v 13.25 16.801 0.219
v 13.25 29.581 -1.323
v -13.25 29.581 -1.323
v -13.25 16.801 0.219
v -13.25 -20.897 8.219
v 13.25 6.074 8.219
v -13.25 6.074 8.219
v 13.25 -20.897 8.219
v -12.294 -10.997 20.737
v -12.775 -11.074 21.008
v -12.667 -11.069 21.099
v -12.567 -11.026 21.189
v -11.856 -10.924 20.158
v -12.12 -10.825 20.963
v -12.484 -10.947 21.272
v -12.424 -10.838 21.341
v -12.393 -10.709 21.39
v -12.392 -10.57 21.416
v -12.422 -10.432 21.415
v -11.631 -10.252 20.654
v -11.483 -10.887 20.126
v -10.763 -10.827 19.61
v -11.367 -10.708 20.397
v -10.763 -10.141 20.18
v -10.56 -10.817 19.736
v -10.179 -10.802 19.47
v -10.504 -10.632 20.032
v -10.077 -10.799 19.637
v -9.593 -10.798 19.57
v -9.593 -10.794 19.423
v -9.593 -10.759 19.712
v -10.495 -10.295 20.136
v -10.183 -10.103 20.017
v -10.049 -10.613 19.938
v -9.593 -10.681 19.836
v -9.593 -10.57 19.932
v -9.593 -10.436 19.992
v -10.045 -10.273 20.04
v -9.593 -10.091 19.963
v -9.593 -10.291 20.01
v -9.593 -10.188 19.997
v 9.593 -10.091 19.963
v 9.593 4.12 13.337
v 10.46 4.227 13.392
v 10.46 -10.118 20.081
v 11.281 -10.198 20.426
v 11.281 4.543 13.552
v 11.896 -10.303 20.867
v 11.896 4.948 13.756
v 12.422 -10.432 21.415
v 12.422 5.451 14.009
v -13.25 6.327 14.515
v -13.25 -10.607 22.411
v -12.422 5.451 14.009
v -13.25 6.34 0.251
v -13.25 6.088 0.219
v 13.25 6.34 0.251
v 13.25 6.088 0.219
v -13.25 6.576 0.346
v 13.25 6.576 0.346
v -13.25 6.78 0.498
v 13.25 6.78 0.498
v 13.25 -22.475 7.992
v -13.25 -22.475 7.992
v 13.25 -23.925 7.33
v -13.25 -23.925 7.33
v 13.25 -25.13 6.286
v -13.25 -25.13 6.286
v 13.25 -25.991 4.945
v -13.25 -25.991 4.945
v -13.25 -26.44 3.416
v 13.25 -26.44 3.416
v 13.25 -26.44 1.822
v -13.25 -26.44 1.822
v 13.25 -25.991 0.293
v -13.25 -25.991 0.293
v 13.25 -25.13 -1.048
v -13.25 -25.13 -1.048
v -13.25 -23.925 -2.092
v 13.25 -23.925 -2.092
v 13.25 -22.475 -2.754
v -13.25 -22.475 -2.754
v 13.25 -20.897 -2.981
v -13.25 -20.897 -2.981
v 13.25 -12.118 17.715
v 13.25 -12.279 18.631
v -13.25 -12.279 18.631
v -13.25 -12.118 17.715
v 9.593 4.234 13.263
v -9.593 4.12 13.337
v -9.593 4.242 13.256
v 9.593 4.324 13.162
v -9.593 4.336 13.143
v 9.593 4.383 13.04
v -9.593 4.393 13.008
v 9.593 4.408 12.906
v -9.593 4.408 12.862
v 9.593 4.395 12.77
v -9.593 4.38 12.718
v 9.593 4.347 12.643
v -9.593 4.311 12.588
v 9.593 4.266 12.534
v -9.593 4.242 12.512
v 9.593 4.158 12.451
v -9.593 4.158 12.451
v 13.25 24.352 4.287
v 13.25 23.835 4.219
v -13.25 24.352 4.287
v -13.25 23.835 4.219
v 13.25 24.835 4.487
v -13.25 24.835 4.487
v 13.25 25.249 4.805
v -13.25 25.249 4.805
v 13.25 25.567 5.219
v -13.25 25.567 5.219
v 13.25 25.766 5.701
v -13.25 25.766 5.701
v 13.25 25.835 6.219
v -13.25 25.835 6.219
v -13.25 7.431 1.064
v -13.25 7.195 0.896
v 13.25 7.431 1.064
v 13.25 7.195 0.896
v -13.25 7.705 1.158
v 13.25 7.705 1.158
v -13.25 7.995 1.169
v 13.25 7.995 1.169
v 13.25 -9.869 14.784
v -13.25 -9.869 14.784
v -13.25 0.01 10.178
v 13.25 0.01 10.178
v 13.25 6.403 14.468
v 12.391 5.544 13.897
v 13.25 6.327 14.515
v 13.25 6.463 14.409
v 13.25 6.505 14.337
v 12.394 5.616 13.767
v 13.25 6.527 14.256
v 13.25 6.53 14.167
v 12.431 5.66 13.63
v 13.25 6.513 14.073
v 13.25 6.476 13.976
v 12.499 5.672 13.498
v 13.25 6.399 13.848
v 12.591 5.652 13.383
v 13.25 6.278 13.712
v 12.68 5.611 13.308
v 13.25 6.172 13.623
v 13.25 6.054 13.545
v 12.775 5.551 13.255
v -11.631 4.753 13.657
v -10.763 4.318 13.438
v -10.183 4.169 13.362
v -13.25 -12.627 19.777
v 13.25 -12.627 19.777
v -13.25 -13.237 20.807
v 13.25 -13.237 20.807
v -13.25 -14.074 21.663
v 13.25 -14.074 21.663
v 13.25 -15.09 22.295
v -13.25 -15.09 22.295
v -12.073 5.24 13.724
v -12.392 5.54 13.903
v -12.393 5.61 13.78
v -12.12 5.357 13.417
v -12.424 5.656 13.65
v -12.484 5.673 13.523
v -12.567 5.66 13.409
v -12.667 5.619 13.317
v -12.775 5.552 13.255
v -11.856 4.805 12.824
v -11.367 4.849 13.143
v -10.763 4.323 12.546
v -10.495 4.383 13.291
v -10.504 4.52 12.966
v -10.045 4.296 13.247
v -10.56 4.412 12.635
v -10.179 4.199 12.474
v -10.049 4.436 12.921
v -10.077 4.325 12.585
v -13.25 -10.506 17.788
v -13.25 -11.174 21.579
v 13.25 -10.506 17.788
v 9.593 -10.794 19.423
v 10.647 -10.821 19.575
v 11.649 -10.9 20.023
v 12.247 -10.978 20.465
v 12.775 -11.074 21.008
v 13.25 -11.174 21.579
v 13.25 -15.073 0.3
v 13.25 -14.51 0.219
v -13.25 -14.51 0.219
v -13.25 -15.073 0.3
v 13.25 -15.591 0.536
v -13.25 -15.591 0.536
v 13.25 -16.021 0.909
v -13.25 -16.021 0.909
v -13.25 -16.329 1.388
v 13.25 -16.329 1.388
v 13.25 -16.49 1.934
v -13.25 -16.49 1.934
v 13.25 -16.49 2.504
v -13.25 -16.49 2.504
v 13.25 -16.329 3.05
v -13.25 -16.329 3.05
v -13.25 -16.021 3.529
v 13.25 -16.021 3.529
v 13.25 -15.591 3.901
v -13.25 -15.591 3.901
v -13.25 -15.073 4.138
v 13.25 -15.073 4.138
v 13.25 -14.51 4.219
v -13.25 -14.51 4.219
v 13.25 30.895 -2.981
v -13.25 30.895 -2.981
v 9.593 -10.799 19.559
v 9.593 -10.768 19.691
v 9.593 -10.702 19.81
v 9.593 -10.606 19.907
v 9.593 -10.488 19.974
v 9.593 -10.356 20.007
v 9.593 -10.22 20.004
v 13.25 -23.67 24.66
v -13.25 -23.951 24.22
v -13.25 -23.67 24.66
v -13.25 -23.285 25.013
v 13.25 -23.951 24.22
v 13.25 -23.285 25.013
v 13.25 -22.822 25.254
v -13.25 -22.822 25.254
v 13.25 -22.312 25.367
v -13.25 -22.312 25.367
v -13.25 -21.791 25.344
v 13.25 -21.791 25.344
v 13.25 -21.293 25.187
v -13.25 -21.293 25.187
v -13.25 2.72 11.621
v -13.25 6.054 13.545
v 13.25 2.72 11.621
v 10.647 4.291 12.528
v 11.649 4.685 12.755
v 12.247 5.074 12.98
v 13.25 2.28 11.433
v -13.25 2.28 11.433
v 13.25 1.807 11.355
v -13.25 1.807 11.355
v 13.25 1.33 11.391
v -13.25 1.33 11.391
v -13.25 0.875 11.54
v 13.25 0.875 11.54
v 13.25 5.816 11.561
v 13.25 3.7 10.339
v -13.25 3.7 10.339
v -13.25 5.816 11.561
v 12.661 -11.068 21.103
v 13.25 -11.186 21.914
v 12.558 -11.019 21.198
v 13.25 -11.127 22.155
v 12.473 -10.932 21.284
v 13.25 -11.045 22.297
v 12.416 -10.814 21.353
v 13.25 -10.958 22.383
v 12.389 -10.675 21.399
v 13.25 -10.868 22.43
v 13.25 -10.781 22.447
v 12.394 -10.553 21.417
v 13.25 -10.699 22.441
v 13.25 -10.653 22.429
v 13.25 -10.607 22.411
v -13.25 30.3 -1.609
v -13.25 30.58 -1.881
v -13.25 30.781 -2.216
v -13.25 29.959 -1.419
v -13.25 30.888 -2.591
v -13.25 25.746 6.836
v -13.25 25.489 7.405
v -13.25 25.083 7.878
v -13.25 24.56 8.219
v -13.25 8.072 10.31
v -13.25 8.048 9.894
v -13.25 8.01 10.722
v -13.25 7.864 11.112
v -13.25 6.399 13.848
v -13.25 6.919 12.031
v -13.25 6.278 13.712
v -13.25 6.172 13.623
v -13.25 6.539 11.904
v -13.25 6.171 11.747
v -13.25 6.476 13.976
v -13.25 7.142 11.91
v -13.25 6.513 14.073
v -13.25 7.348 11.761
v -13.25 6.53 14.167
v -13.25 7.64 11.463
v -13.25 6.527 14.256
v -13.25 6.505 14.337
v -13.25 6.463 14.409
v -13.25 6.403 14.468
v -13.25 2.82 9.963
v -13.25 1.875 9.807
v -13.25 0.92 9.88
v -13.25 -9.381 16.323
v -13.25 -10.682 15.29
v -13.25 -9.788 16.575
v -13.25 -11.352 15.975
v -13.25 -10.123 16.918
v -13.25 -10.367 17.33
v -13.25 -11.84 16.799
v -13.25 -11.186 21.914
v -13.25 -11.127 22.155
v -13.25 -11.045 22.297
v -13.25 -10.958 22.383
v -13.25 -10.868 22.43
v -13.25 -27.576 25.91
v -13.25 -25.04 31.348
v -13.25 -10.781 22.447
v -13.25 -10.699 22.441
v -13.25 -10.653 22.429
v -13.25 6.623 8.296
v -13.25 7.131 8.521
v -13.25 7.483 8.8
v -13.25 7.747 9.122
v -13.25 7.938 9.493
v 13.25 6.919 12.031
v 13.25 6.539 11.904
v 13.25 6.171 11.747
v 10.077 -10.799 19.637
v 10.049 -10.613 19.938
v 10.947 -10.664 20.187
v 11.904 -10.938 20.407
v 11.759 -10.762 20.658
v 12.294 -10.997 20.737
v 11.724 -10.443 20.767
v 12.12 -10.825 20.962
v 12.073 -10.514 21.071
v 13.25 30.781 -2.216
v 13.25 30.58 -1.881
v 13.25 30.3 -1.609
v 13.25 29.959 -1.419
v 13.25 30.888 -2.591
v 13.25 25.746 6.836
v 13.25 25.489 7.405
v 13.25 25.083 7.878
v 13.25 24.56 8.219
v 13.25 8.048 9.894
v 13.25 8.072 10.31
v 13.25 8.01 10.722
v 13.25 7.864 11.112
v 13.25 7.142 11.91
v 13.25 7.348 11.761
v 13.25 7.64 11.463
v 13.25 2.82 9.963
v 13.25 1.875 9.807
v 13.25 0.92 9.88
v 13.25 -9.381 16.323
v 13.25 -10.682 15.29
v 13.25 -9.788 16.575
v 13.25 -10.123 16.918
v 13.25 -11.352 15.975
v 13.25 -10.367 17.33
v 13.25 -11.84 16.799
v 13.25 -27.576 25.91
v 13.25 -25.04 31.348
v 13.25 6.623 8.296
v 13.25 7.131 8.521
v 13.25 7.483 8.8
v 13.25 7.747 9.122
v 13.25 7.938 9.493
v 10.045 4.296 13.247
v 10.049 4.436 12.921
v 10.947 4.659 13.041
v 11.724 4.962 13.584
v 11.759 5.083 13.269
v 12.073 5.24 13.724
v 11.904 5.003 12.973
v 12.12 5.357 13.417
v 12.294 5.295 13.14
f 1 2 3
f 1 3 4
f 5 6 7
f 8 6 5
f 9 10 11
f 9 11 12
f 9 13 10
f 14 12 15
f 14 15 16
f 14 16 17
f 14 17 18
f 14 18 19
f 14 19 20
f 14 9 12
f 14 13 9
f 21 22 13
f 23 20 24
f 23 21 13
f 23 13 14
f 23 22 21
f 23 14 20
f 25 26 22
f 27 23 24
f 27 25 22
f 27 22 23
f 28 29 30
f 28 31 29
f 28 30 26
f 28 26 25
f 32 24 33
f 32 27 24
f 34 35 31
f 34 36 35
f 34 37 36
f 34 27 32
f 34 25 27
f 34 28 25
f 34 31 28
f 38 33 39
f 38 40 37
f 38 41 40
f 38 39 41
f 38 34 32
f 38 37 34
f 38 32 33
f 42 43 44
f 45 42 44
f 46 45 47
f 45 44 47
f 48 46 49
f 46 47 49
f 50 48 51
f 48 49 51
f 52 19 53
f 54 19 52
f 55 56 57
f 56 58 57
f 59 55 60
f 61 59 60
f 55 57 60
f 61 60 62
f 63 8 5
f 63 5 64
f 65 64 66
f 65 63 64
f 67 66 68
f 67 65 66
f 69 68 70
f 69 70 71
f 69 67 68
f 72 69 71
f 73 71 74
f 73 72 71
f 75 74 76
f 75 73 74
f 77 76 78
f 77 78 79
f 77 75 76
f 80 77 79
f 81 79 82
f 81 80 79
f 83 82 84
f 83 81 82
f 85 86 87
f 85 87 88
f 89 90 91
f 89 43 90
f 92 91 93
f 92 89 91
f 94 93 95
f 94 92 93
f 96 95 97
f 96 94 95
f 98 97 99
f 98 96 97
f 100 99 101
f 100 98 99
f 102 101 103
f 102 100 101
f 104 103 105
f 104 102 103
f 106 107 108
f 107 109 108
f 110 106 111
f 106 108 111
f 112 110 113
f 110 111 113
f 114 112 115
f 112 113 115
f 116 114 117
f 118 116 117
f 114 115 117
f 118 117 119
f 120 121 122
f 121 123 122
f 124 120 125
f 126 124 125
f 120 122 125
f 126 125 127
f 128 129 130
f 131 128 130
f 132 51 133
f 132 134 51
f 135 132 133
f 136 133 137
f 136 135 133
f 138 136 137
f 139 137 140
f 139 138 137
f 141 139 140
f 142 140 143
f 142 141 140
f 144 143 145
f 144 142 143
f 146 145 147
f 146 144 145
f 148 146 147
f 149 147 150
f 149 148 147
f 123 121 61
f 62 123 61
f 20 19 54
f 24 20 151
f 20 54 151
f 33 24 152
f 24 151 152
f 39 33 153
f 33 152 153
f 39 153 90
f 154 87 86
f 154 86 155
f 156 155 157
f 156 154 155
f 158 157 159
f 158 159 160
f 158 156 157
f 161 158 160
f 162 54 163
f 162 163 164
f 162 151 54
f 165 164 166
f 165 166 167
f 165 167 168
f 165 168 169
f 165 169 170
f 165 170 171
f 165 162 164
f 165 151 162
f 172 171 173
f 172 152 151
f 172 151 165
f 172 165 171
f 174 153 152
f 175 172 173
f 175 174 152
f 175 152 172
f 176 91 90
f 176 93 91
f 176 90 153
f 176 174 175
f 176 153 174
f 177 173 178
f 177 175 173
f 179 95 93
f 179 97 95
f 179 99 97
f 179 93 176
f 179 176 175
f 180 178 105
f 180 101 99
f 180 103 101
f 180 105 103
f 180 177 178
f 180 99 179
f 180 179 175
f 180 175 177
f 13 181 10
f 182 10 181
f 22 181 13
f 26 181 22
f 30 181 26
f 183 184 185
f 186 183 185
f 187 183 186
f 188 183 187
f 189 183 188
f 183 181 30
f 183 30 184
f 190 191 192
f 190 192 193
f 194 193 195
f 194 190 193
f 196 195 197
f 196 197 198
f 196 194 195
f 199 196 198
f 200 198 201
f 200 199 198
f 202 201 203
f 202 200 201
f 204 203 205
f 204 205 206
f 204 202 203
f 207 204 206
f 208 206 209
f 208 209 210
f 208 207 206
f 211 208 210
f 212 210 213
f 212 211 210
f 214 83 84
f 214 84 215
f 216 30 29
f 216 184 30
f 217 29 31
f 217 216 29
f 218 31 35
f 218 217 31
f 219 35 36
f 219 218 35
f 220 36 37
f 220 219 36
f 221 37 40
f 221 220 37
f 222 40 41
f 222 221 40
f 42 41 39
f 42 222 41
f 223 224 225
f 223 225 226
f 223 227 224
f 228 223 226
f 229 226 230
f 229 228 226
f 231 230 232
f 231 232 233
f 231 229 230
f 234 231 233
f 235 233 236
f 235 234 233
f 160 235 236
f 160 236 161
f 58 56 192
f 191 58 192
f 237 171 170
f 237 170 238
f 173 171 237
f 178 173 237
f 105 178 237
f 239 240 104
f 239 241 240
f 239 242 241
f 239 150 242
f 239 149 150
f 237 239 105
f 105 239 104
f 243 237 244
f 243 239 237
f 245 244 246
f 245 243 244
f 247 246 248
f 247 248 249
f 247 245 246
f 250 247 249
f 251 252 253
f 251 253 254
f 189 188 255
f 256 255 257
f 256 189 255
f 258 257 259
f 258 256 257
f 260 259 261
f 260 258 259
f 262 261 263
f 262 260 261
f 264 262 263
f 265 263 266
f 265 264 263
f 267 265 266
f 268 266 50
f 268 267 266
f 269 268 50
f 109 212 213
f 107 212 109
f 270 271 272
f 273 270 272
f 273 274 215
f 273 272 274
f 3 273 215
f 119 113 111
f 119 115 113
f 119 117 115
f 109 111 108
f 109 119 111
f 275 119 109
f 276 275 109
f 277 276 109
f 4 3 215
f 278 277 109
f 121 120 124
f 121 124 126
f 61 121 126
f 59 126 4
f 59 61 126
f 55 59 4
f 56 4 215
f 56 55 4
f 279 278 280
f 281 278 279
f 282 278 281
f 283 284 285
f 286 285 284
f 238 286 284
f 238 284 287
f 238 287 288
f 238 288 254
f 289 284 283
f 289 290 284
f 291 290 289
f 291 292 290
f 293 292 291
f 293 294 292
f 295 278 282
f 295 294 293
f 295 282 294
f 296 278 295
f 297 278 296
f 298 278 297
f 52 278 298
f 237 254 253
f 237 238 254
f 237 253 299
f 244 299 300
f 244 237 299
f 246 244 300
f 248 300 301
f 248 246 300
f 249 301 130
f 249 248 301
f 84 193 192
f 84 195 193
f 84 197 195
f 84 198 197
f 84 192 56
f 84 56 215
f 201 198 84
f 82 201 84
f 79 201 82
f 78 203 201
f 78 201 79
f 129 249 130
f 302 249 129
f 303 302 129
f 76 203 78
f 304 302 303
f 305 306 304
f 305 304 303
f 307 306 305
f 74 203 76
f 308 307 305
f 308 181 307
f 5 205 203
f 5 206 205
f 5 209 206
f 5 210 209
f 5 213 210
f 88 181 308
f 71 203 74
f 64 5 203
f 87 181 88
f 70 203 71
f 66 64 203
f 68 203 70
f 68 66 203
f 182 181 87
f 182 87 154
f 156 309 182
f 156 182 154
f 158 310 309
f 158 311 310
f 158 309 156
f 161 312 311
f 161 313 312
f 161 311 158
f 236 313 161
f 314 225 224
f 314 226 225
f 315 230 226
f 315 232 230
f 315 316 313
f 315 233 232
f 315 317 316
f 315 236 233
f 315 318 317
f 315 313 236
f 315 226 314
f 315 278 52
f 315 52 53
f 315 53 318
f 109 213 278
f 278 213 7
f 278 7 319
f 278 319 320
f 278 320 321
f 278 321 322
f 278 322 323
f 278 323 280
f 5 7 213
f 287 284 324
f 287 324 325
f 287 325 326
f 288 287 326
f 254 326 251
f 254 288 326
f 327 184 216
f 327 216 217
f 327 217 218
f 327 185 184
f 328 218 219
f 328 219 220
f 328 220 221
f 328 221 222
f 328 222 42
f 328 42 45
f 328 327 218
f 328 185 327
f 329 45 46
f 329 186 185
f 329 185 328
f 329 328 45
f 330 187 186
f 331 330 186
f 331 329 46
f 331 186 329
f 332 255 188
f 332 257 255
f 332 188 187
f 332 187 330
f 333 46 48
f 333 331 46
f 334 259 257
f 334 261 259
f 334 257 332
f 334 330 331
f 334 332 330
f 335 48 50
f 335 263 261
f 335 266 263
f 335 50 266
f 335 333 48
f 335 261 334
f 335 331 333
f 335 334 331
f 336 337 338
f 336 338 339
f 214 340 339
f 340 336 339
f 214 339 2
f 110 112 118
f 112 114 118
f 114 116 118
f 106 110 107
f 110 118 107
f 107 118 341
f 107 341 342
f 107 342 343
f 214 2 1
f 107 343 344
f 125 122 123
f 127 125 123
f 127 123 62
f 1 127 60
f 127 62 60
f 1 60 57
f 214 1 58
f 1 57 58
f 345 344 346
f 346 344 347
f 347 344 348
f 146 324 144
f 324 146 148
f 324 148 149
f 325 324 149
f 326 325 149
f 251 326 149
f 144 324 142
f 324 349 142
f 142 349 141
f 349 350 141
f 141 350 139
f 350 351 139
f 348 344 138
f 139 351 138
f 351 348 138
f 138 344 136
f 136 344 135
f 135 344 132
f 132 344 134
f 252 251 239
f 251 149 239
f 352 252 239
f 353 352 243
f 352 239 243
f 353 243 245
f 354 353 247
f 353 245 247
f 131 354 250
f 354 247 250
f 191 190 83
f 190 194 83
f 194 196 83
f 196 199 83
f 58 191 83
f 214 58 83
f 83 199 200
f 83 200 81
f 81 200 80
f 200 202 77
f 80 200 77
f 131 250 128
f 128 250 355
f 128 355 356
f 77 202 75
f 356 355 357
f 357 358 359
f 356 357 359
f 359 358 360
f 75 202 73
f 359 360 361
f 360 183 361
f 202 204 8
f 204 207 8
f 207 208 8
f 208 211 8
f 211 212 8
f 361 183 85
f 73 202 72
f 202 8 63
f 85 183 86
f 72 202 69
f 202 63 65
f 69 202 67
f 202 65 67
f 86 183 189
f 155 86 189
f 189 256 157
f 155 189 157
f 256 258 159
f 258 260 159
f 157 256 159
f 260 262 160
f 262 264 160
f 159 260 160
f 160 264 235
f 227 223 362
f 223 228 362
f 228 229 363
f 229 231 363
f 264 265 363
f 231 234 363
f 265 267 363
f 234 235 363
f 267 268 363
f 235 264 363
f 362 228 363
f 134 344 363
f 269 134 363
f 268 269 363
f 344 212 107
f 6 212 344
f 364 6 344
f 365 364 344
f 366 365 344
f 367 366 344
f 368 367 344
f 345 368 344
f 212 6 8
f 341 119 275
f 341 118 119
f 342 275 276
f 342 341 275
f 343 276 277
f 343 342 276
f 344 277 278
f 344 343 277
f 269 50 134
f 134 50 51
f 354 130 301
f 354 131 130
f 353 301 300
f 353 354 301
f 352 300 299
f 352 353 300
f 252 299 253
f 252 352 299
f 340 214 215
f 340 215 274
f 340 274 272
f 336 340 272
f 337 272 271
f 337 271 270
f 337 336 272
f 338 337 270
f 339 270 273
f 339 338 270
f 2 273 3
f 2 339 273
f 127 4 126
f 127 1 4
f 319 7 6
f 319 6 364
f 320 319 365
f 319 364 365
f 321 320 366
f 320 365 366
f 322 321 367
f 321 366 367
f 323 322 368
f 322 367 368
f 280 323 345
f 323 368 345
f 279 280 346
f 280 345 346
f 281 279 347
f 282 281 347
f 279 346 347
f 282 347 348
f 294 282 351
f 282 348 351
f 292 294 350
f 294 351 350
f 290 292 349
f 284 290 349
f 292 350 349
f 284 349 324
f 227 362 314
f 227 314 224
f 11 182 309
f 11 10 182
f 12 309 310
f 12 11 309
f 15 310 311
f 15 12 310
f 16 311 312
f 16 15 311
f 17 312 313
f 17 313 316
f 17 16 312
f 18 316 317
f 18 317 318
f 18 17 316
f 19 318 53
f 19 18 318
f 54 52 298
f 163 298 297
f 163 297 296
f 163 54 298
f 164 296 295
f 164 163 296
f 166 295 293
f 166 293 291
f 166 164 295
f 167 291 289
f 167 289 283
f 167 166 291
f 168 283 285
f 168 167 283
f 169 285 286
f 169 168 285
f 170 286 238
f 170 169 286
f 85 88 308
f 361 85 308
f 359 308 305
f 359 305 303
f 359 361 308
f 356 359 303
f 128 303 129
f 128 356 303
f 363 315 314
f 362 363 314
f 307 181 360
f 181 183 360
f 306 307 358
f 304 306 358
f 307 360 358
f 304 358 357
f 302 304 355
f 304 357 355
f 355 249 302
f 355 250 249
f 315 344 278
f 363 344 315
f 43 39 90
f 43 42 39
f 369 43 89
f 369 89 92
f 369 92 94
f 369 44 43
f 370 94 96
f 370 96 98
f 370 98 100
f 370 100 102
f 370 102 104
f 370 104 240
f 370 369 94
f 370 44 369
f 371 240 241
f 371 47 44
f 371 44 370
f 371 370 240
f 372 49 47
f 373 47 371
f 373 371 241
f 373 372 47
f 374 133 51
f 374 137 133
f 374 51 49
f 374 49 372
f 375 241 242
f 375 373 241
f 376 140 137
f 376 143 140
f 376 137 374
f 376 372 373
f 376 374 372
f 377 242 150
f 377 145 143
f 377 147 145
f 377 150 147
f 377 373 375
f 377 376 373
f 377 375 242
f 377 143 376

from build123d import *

# Parameters (mm, degrees)
F1_DEPTH    = 13.25
F2_DEPTH    = 13.25
F3_R        = 1
F4_R        = 1.99999
F5_T1_DEPTH = 26.5
F6_R        = 4
F7_SIZE     = 2
F8_R        = 4
F9_R        = 2
F10_R       = 0.5


# Not quite as in the source:
# - a fillet or chamfer that OpenCascade refuses, or shapes differently, is made with other operations: its cross-section is extruded or revolved along the edge and cut away or added
# - a fillet or chamfer is up to 0.001 mm smaller than in the source, because OpenCascade refuses the exact size


with BuildPart() as f1:
    # F0 (on Right) → F1 (new body, symmetric)
    with BuildSketch(Plane.YZ):
        with BuildLine():
            Line((24.5604159161, 8.2188727885), (-25.0402941419, 31.3480637385))
            Line((-25.0402941419, 31.3480637385), (-27.5760037124, 25.9102170163))
            Line((-27.5760037124, 25.9102170163), (-23.9507725642, 24.2197439694))
            Line((-23.9507725642, 24.2197439694), (-23.1055360408, 26.0323595434))
            Line((-23.1055360408, 26.0323595434), (-12.7312477201, 21.1947494516))
            Line((-12.7312477201, 21.1947494516), (-10.9610116945, 20.3692748361))
            Line((-10.9610116945, 20.3692748361), (4.9900053574, 12.9311934295))
            Line((4.9900053574, 12.9311934295), (6.760241383, 12.105718814))
            Line((6.760241383, 12.105718814), (7.7089287185, 11.6633386442))
            Line((7.7089287185, 11.6633386442), (15.0956095835, 8.2188727885))
            Line((15.0956095835, 8.2188727885), (7.7089287185, 8.2188727885))
            Line((7.7089287185, 8.2188727885), (-20.8974118188, 8.2188727885))
            ThreePointArc((-20.8974118188, 8.2188727885), (-26.4974118188, 2.6188727885), (-20.8974118188, -2.9811272115))
            Line((-20.8974118188, -2.9811272115), (30.894998731, -2.9811272115))
            ThreePointArc((30.894998731, -2.9811272115), (30.580160342, -1.8806088655), (29.580710732, -1.3226085804))
            Line((29.580710732, -1.3226085804), (16.8007476451, 0.2188727885))
            Line((16.8007476451, 0.2188727885), (6.4900759503, 0.2188727885))
            Line((6.4900759503, 0.2188727885), (-14.5099240497, 0.2188727885))
            ThreePointArc((-14.5099240497, 0.2188727885), (-16.5099240497, 2.2188727885), (-14.5099240497, 4.2188727885))
            Line((-14.5099240497, 4.2188727885), (24.5604159161, 4.2188727885))
            ThreePointArc((24.5604159161, 4.2188727885), (25.8345564377, 6.2188727885), (24.5604159161, 8.2188727885))
        make_face()
        Polygon((-10.9610116945, 20.3692748361), (-12.7312477201, 21.1947494516), (-11.7561154197, 15.664499365), (1.8970210747, 9.2979372598), (6.760241383, 12.105718814), (4.9900053574, 12.9311934295), (1.8183399389, 11.1000315463), (-10.3250558464, 16.762589997), align=None)
    extrude(amount=F1_DEPTH, both=True)

    # F0 (on Right) → F2 (join, symmetric)
    with BuildSketch(Plane.YZ):
        with BuildLine():
            Line((15.0956095835, 8.2188727885), (7.7089287185, 11.6633386442))
            ThreePointArc((7.7089287185, 11.6633386442), (8.806112099, 9.9411057164), (7.7089287185, 8.2188727885))
            Line((7.7089287185, 8.2188727885), (15.0956095835, 8.2188727885))
        make_face()
        with BuildLine():
            Line((24.5604159161, 8.2188727885), (-25.0402941419, 31.3480637385))
            Line((-25.0402941419, 31.3480637385), (-27.5760037124, 25.9102170163))
            Line((-27.5760037124, 25.9102170163), (-23.9507725642, 24.2197439694))
            Line((-23.9507725642, 24.2197439694), (-23.1055360408, 26.0323595434))
            Line((-23.1055360408, 26.0323595434), (-12.7312477201, 21.1947494516))
            Line((-12.7312477201, 21.1947494516), (-10.9610116945, 20.3692748361))
            Line((-10.9610116945, 20.3692748361), (4.9900053574, 12.9311934295))
            Line((4.9900053574, 12.9311934295), (6.760241383, 12.105718814))
            Line((6.760241383, 12.105718814), (7.7089287185, 11.6633386442))
            Line((7.7089287185, 11.6633386442), (15.0956095835, 8.2188727885))
            Line((15.0956095835, 8.2188727885), (7.7089287185, 8.2188727885))
            Line((7.7089287185, 8.2188727885), (-20.8974118188, 8.2188727885))
            ThreePointArc((-20.8974118188, 8.2188727885), (-26.4974118188, 2.6188727885), (-20.8974118188, -2.9811272115))
            Line((-20.8974118188, -2.9811272115), (30.894998731, -2.9811272115))
            ThreePointArc((30.894998731, -2.9811272115), (30.580160342, -1.8806088655), (29.580710732, -1.3226085804))
            Line((29.580710732, -1.3226085804), (16.8007476451, 0.2188727885))
            Line((16.8007476451, 0.2188727885), (6.4900759503, 0.2188727885))
            Line((6.4900759503, 0.2188727885), (-14.5099240497, 0.2188727885))
            ThreePointArc((-14.5099240497, 0.2188727885), (-16.5099240497, 2.2188727885), (-14.5099240497, 4.2188727885))
            Line((-14.5099240497, 4.2188727885), (24.5604159161, 4.2188727885))
            ThreePointArc((24.5604159161, 4.2188727885), (25.8345564377, 6.2188727885), (24.5604159161, 8.2188727885))
        make_face()
        Polygon((7.5313132472, 1.2188727885), (6.4900759503, 0.2188727885), (16.8007476451, 0.2188727885), align=None)
    extrude(amount=F2_DEPTH, both=True)

    # F3
    f3_edges = [f1.edges().sort_by_distance(p)[0] for p in [
        (0, 6.490076, 0.218873),
        (0, 7.531313, 1.218873),
        (0, 16.800748, 0.218873),
    ]]
    fillet(f3_edges, radius=F3_R)

    # F4 (radius 2 in the source; OpenCascade refuses exactly that, so slightly less here)
    f4_edges = [f1.edges().sort_by_distance(p)[0] for p in [
        (0, -23.105536, 26.03236),
        (0, 24.560416, 8.218873),
        (0, 24.560416, 4.218873),
        (0, 7.708929, 8.218873),
        (0, 7.708929, 11.663339),
    ]]
    fillet(f4_edges, radius=F4_R)

    # F5: fillet of radius 5 on 2 edges, made by hand

    # F5_s2 → F5_t1 (join)
    with BuildSketch(Plane.YZ.offset(-13.25)):
        with BuildLine():
            ThreePointArc((-12.2792701217, 18.6314571149), (-13.2365421853, 20.8070233716), (-15.090217578, 22.2947551617))
            Line((-15.090217578, 22.2947551617), (-12.7312477201, 21.1947494516))
            Line((-12.7312477201, 21.1947494516), (-12.2792701217, 18.6314571149))
        make_face()
        with BuildLine():
            ThreePointArc((6.9194699805, 12.0314692995), (6.3536054599, 11.8292518467), (5.8160865891, 11.5606107896))
            Line((5.8160865891, 11.5606107896), (6.760241383, 12.105718814))
            Line((6.760241383, 12.105718814), (6.9194699805, 12.0314692995))
        make_face()
    extrude(amount=F5_T1_DEPTH)

    # F6
    f6_edges = [f1.edges().sort_by_distance(p)[0] for p in [
        (0, 1.897021, 9.297937),
        (0, -11.756115, 15.664499),
    ]]
    fillet(f6_edges, radius=F6_R)

    # F7
    f7_edges = [f1.edges().sort_by_distance(p)[0] for p in [
        (13.25, -2.985503, 16.650234),
        (-13.25, -2.985503, 16.650234),
    ]]
    chamfer(f7_edges, length=F7_SIZE)

    # F8
    f8_edges = [f1.edges().sort_by_distance(p)[0] for p in [
        (-11.25, -2.985503, 16.650234),
        (11.25, -2.985503, 16.650234),
    ]]
    fillet(f8_edges, radius=F8_R)

    # F9
    f9_edges = [f1.edges().sort_by_distance(p)[0] for p in [
        (0, -10.325056, 16.76259),
        (0, 1.81834, 11.100032),
    ]]
    fillet(f9_edges, radius=F9_R)

    # F10
    f10_edges = [f1.edges().sort_by_distance(p)[0] for p in [
        (-11.167025, 5.331118, 13.128135),
        (-11.167025, -11.029409, 20.757174),
        (11.123879, -11.025557, 20.735332),
        (0, -10.961012, 20.369275),
        (11.123879, 5.31191, 13.117045),
        (0, 4.990005, 12.931193),
    ]]
    fillet(f10_edges, radius=F10_R)


solid = f1.part
